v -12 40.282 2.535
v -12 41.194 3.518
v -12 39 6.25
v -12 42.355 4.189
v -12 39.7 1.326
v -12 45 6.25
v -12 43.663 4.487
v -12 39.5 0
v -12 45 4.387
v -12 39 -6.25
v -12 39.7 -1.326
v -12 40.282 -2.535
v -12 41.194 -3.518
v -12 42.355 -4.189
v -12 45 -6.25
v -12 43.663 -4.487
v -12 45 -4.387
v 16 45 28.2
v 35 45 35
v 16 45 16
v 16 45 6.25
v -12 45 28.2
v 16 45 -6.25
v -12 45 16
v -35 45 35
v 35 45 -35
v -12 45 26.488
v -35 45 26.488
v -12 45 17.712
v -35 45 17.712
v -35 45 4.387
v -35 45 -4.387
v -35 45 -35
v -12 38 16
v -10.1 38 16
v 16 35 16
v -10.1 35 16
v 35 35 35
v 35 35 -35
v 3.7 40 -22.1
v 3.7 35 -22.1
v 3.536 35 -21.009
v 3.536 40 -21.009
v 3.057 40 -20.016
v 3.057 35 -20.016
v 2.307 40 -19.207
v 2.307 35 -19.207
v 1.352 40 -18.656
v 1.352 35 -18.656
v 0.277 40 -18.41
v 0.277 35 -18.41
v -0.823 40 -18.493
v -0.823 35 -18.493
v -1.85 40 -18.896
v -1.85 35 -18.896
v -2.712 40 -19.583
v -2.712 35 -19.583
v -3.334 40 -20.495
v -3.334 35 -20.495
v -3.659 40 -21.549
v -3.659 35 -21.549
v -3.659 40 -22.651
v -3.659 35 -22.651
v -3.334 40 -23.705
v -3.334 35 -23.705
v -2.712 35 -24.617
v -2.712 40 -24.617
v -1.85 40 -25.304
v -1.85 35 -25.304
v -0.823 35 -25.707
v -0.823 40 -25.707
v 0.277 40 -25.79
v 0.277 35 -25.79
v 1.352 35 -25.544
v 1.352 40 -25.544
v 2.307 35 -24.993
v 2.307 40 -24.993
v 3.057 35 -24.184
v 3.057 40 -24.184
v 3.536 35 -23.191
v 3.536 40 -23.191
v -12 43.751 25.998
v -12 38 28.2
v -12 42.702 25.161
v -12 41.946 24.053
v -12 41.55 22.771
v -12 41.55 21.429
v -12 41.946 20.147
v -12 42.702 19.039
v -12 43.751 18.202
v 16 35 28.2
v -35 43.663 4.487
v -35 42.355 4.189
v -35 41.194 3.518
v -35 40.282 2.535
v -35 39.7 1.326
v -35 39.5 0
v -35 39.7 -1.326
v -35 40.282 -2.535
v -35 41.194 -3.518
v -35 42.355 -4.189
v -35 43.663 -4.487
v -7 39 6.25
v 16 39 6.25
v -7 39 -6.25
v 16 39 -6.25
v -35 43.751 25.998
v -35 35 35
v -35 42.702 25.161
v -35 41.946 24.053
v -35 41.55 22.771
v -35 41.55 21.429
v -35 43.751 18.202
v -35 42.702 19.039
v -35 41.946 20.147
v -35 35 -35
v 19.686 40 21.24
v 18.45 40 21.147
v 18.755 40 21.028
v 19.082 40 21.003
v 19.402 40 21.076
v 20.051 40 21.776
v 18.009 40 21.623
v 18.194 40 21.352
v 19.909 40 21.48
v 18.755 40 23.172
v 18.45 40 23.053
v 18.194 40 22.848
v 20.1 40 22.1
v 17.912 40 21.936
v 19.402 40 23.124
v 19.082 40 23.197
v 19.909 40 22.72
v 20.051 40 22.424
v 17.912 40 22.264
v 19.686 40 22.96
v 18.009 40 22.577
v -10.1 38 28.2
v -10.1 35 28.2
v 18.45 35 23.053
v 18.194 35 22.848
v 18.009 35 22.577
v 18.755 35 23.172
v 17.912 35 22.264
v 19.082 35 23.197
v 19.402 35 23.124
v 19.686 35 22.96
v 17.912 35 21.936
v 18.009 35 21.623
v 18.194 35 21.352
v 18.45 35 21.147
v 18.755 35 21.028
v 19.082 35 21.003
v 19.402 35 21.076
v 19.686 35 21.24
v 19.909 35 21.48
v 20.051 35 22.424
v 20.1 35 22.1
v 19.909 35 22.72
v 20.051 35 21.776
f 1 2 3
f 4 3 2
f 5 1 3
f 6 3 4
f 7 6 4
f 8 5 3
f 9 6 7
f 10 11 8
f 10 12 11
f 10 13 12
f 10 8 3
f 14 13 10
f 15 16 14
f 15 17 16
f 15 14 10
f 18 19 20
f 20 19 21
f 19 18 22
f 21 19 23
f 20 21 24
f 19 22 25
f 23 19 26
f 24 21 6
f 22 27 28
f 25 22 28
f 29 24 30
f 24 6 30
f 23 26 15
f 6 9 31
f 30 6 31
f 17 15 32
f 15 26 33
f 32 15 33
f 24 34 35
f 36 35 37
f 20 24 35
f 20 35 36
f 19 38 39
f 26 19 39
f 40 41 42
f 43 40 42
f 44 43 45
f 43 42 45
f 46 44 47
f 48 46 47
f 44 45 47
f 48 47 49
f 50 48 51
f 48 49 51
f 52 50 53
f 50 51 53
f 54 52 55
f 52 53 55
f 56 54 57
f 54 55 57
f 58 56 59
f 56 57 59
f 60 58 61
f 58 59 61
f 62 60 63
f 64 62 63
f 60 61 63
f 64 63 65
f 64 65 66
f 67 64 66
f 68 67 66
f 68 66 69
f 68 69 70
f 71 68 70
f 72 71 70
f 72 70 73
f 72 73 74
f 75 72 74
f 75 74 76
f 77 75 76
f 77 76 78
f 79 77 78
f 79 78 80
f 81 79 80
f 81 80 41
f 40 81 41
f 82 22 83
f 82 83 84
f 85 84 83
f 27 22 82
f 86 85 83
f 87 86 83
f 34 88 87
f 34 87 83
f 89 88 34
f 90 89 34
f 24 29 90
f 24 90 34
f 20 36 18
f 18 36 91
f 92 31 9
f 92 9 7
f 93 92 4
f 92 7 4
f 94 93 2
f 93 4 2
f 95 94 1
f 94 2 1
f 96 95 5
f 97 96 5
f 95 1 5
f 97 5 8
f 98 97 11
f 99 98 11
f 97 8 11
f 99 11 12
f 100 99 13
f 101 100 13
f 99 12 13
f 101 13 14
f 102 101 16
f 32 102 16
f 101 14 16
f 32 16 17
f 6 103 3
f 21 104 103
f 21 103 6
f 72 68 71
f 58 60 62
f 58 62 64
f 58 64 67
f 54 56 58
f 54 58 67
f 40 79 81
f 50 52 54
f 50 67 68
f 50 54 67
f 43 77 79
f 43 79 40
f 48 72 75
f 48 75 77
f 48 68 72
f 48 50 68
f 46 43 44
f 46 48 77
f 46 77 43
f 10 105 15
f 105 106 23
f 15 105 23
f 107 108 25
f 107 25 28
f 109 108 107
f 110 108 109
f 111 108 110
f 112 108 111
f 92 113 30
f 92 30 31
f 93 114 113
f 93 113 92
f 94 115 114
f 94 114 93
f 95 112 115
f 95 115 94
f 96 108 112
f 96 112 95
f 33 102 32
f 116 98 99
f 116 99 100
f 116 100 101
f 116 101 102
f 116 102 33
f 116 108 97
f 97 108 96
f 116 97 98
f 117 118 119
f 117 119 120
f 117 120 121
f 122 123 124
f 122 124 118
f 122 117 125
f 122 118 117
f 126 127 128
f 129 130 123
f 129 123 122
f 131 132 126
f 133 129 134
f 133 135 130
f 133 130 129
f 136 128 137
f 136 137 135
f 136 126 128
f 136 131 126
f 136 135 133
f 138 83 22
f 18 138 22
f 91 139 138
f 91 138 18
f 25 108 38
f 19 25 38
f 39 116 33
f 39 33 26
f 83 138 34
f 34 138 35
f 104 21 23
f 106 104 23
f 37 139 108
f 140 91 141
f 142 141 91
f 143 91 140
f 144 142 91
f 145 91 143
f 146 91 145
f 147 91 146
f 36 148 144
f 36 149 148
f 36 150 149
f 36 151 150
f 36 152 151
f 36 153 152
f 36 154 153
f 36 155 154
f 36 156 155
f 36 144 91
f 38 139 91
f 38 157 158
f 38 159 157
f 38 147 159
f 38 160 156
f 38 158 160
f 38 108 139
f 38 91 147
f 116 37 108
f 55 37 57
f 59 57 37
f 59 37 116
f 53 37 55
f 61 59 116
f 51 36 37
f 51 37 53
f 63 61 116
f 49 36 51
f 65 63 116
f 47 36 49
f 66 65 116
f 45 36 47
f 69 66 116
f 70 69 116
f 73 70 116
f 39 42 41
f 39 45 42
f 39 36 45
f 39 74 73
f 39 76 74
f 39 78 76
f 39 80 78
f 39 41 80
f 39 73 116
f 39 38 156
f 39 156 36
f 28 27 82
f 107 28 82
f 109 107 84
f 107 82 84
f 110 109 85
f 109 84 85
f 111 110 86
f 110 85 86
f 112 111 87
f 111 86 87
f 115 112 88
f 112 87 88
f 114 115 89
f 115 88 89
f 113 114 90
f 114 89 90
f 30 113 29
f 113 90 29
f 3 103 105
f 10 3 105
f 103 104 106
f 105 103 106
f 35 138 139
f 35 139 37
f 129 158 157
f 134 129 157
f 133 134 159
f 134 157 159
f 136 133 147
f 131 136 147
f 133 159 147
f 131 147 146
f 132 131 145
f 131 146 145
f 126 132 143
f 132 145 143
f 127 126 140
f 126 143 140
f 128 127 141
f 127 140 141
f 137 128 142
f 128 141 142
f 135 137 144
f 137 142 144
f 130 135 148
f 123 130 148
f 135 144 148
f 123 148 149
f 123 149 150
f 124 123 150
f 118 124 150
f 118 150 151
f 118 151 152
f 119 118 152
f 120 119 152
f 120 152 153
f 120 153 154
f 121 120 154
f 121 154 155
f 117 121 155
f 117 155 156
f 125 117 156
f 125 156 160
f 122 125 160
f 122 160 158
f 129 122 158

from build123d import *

# Parameters (mm, degrees)
CROQUIS1_W              = 64
CROQUIS1_H              = 64
SALIENTE_EXTRUIR1_DEPTH = 60
CROQUIS2_W              = 70
CROQUIS2_H              = 70
CROQUIS2_W_2            = 64
CROQUIS2_H_2            = 64
SALIENTE_EXTRUIR2_DEPTH = 64
CORTAR_EXTRUIR1_DEPTH   = 21
CROQUIS5_R              = 1.1
CORTAR_EXTRUIR2_DEPTH   = 10
CORTAR_EXTRUIR3_REACH   = 30
CROQUIS10_R             = 4.5
CROQUIS11_W             = 70
CROQUIS11_H             = 70
CORTAR_EXTRUIR4_DEPTH   = 30
CROQUIS12_W             = 23
CROQUIS12_H             = 12.2
CORTAR_EXTRUIR5_DEPTH   = 21
CORTAR_EXTRUIR6_REACH   = 30
CROQUIS13_R             = 4.5
CROQUIS14_R             = 1.1
CORTAR_EXTRUIR7_DEPTH   = 10
CROQUIS15_R             = 3.7
CORTAR_EXTRUIR8_DEPTH   = 10
CROQUIS16_W             = 64
CROQUIS16_H             = 64
CORTAR_EXTRUIR9_DEPTH   = 5
CROQUIS17_W             = 12.5
CROQUIS17_H             = 12.998685397
CORTAR_EXTRUIR10_DEPTH  = 5
CORTAR_EXTRUIR11_REACH  = 72
CROQUIS18_W             = 70
CROQUIS18_H             = 9
CROQUIS18_H_2           = 5.000169364
CORTAR_EXTRUIR13_DEPTH  = 5
CORTAR_EXTRUIR14_REACH  = 12
CROQUIS21_W             = 81.467019472
CROQUIS21_H             = 81.467019472
CORTAR_EXTRUIR15_REACH  = 5
CROQUIS22_W             = 3.1
CROQUIS22_H             = 12.2


with BuildPart() as part:
    # Croquis1 → Saliente-Extruir1 (new body)
    with BuildSketch(Plane(origin=(0, 0, 0), x_dir=(1, 0, 0), z_dir=(0, 1, 0))):
        Rectangle(CROQUIS1_W, CROQUIS1_H)
    extrude(amount=SALIENTE_EXTRUIR1_DEPTH)

    # Croquis2 → Saliente-Extruir2 (add)
    with BuildSketch(Plane(origin=(0, 0, 0), x_dir=(1, 0, 0), z_dir=(0, 1, 0))):
        Rectangle(CROQUIS2_W, CROQUIS2_H)
        Rectangle(CROQUIS2_W_2, CROQUIS2_H_2, mode=Mode.SUBTRACT)
    extrude(amount=SALIENTE_EXTRUIR2_DEPTH)

    # Croquis4 → Cortar-Extruir1 (cut)
    with BuildSketch(Plane(origin=(0, 60, 0), x_dir=(1, 0, 0), z_dir=(0, 1, 0))):
        Polygon((-7, 6), (-7, -6), (-7, -6.25), (16, -6.25), (16, -6), (16, 6), (16, 6.25), (-7, 6.25), align=None)
    extrude(amount=-CORTAR_EXTRUIR1_DEPTH, mode=Mode.SUBTRACT)

    # Croquis5 → Cortar-Extruir2 (cut)
    with BuildSketch(Plane(origin=(0, 60, 0), x_dir=(1, 0, 0), z_dir=(0, 1, 0))):
        with Locations((19, 0)):
            Circle(CROQUIS5_R)
        with Locations((-9, 0)):
            Circle(CROQUIS5_R)
    extrude(amount=-CORTAR_EXTRUIR2_DEPTH, mode=Mode.SUBTRACT)

    # Croquis10 → Cortar-Extruir3 (cut, up to next)
    with BuildSketch(Plane(origin=(-7, 0, 0), x_dir=(0, 0, -1), z_dir=(1, 0, 0)), mode=Mode.PRIVATE) as cortar_extruir3_sk1:
        with Locations((0, 44)):
            Circle(CROQUIS10_R)
    cortar_extruir3_tool1 = extrude(cortar_extruir3_sk1.sketch, amount=-CORTAR_EXTRUIR3_REACH, mode=Mode.PRIVATE) & part.part
    add(cortar_extruir3_tool1.solids().sort_by_distance((-7, 44, 0))[0], mode=Mode.SUBTRACT)

    # Croquis11 → Cortar-Extruir4 (cut)
    with BuildSketch(Plane.XZ):
        Rectangle(CROQUIS11_W, CROQUIS11_H)
    extrude(amount=-CORTAR_EXTRUIR4_DEPTH, mode=Mode.SUBTRACT)

    # Croquis12 → Cortar-Extruir5 (cut)
    with BuildSketch(Plane.XZ.offset(-30)):
        with Locations((4.5, 22.1)):
            Rectangle(CROQUIS12_W, CROQUIS12_H)
    extrude(amount=-CORTAR_EXTRUIR5_DEPTH, mode=Mode.SUBTRACT)

    # Croquis13 → Cortar-Extruir6 (cut, up to next)
    with BuildSketch(Plane(origin=(-7, 0, 0), x_dir=(0, 0, -1), z_dir=(1, 0, 0)), mode=Mode.PRIVATE) as cortar_extruir6_sk1:
        with Locations((-22.1, 46)):
            Circle(CROQUIS13_R)
    cortar_extruir6_tool1 = extrude(cortar_extruir6_sk1.sketch, amount=-CORTAR_EXTRUIR6_REACH, mode=Mode.PRIVATE) & part.part
    add(cortar_extruir6_tool1.solids().sort_by_distance((-7, 46, 22.1))[0], mode=Mode.SUBTRACT)

    # Croquis14 → Cortar-Extruir7 (cut)
    with BuildSketch(Plane.XZ.offset(-30)):
        with Locations((19, 22.1)):
            Circle(CROQUIS14_R)
        with Locations((-9, 22.1)):
            Circle(CROQUIS14_R)
    extrude(amount=-CORTAR_EXTRUIR7_DEPTH, mode=Mode.SUBTRACT)

    # Croquis15 → Cortar-Extruir8 (cut)
    with BuildSketch(Plane.XZ.offset(-30)):
        with Locations((0, -22.1)):
            Circle(CROQUIS15_R)
    extrude(amount=-CORTAR_EXTRUIR8_DEPTH, mode=Mode.SUBTRACT)

    # Croquis16 → Cortar-Extruir9 (cut)
    with BuildSketch(Plane(origin=(0, 60, 0), x_dir=(1, 0, 0), z_dir=(0, 1, 0))):
        Rectangle(CROQUIS16_W, CROQUIS16_H)
    extrude(amount=-CORTAR_EXTRUIR9_DEPTH, mode=Mode.SUBTRACT)

    # Croquis17 → Cortar-Extruir10 (cut)
    with BuildSketch(Plane(origin=(-7, 0, 0), x_dir=(0, 0, -1), z_dir=(1, 0, 0))):
        with Locations((0, 45.499342699)):
            Rectangle(CROQUIS17_W, CROQUIS17_H)
    extrude(amount=-CORTAR_EXTRUIR10_DEPTH, mode=Mode.SUBTRACT)

    # Croquis18 → Cortar-Extruir11 (cut, up to next)
    with BuildSketch(Plane(origin=(35, 0, 0), x_dir=(0, 0, -1), z_dir=(1, 0, 0)), mode=Mode.PRIVATE) as cortar_extruir11_sk1:
        with Locations((0, 59.5)):
            Rectangle(CROQUIS18_W, CROQUIS18_H)
    cortar_extruir11_tool1 = extrude(cortar_extruir11_sk1.sketch, amount=-CORTAR_EXTRUIR11_REACH, mode=Mode.PRIVATE) & part.part
    add(cortar_extruir11_tool1.solids().sort_by_distance((35, 59.5, 0))[0], mode=Mode.SUBTRACT)
    # Croquis18 → Cortar-Extruir11 (cut, up to next)
    with BuildSketch(Plane(origin=(35, 0, 0), x_dir=(0, 0, -1), z_dir=(1, 0, 0)), mode=Mode.PRIVATE) as cortar_extruir11_sk2:
        with Locations((0, 32.500084682)):
            Rectangle(CROQUIS18_W, CROQUIS18_H_2)
    cortar_extruir11_tool2 = extrude(cortar_extruir11_sk2.sketch, amount=-CORTAR_EXTRUIR11_REACH, mode=Mode.PRIVATE) & part.part
    add(cortar_extruir11_tool2.solids().sort_by_distance((35, 32.500085, 0))[0], mode=Mode.SUBTRACT)

    # Croquis19 → Cortar-Extruir13 (cut)
    with BuildSketch(Plane(origin=(-7, 0, 0), x_dir=(0, 0, -1), z_dir=(1, 0, 0))):
        Polygon((-16, 51), (-28.2, 51), (-28.2, 38.000169364), (-22.1, 38.000169364), (-16, 38.000169364), align=None)
    extrude(amount=-CORTAR_EXTRUIR13_DEPTH, mode=Mode.SUBTRACT)

    # Croquis21 → Cortar-Extruir14 (cut, up to next)
    with BuildSketch(Plane(origin=(0, 45.000169364, 0), x_dir=(-1, 0, 0), z_dir=(0, -1, 0)), mode=Mode.PRIVATE) as cortar_extruir14_sk1:
        with Locations((0.076423095, -0.764230952)):
            Rectangle(CROQUIS21_W, CROQUIS21_H)
    cortar_extruir14_tool1 = extrude(cortar_extruir14_sk1.sketch, amount=-CORTAR_EXTRUIR14_REACH, mode=Mode.PRIVATE) & part.part
    add(cortar_extruir14_tool1.solids().sort_by_distance((-0.076423, 45.000169, 0.764231))[0], mode=Mode.SUBTRACT)

    # Croquis22 → Cortar-Extruir15 (cut, up to next)
    with BuildSketch(Plane(origin=(0, 38.000169364, 0), x_dir=(1, 0, 0), z_dir=(0, 1, 0)), mode=Mode.PRIVATE) as cortar_extruir15_sk1:
        with Locations((-8.55, -22.1)):
            Rectangle(CROQUIS22_W, CROQUIS22_H)
    cortar_extruir15_tool1 = extrude(cortar_extruir15_sk1.sketch, amount=-CORTAR_EXTRUIR15_REACH, mode=Mode.PRIVATE) & part.part
    add(cortar_extruir15_tool1.solids().sort_by_distance((-8.55, 38.000169, 22.1))[0], mode=Mode.SUBTRACT)


solid = part.part
